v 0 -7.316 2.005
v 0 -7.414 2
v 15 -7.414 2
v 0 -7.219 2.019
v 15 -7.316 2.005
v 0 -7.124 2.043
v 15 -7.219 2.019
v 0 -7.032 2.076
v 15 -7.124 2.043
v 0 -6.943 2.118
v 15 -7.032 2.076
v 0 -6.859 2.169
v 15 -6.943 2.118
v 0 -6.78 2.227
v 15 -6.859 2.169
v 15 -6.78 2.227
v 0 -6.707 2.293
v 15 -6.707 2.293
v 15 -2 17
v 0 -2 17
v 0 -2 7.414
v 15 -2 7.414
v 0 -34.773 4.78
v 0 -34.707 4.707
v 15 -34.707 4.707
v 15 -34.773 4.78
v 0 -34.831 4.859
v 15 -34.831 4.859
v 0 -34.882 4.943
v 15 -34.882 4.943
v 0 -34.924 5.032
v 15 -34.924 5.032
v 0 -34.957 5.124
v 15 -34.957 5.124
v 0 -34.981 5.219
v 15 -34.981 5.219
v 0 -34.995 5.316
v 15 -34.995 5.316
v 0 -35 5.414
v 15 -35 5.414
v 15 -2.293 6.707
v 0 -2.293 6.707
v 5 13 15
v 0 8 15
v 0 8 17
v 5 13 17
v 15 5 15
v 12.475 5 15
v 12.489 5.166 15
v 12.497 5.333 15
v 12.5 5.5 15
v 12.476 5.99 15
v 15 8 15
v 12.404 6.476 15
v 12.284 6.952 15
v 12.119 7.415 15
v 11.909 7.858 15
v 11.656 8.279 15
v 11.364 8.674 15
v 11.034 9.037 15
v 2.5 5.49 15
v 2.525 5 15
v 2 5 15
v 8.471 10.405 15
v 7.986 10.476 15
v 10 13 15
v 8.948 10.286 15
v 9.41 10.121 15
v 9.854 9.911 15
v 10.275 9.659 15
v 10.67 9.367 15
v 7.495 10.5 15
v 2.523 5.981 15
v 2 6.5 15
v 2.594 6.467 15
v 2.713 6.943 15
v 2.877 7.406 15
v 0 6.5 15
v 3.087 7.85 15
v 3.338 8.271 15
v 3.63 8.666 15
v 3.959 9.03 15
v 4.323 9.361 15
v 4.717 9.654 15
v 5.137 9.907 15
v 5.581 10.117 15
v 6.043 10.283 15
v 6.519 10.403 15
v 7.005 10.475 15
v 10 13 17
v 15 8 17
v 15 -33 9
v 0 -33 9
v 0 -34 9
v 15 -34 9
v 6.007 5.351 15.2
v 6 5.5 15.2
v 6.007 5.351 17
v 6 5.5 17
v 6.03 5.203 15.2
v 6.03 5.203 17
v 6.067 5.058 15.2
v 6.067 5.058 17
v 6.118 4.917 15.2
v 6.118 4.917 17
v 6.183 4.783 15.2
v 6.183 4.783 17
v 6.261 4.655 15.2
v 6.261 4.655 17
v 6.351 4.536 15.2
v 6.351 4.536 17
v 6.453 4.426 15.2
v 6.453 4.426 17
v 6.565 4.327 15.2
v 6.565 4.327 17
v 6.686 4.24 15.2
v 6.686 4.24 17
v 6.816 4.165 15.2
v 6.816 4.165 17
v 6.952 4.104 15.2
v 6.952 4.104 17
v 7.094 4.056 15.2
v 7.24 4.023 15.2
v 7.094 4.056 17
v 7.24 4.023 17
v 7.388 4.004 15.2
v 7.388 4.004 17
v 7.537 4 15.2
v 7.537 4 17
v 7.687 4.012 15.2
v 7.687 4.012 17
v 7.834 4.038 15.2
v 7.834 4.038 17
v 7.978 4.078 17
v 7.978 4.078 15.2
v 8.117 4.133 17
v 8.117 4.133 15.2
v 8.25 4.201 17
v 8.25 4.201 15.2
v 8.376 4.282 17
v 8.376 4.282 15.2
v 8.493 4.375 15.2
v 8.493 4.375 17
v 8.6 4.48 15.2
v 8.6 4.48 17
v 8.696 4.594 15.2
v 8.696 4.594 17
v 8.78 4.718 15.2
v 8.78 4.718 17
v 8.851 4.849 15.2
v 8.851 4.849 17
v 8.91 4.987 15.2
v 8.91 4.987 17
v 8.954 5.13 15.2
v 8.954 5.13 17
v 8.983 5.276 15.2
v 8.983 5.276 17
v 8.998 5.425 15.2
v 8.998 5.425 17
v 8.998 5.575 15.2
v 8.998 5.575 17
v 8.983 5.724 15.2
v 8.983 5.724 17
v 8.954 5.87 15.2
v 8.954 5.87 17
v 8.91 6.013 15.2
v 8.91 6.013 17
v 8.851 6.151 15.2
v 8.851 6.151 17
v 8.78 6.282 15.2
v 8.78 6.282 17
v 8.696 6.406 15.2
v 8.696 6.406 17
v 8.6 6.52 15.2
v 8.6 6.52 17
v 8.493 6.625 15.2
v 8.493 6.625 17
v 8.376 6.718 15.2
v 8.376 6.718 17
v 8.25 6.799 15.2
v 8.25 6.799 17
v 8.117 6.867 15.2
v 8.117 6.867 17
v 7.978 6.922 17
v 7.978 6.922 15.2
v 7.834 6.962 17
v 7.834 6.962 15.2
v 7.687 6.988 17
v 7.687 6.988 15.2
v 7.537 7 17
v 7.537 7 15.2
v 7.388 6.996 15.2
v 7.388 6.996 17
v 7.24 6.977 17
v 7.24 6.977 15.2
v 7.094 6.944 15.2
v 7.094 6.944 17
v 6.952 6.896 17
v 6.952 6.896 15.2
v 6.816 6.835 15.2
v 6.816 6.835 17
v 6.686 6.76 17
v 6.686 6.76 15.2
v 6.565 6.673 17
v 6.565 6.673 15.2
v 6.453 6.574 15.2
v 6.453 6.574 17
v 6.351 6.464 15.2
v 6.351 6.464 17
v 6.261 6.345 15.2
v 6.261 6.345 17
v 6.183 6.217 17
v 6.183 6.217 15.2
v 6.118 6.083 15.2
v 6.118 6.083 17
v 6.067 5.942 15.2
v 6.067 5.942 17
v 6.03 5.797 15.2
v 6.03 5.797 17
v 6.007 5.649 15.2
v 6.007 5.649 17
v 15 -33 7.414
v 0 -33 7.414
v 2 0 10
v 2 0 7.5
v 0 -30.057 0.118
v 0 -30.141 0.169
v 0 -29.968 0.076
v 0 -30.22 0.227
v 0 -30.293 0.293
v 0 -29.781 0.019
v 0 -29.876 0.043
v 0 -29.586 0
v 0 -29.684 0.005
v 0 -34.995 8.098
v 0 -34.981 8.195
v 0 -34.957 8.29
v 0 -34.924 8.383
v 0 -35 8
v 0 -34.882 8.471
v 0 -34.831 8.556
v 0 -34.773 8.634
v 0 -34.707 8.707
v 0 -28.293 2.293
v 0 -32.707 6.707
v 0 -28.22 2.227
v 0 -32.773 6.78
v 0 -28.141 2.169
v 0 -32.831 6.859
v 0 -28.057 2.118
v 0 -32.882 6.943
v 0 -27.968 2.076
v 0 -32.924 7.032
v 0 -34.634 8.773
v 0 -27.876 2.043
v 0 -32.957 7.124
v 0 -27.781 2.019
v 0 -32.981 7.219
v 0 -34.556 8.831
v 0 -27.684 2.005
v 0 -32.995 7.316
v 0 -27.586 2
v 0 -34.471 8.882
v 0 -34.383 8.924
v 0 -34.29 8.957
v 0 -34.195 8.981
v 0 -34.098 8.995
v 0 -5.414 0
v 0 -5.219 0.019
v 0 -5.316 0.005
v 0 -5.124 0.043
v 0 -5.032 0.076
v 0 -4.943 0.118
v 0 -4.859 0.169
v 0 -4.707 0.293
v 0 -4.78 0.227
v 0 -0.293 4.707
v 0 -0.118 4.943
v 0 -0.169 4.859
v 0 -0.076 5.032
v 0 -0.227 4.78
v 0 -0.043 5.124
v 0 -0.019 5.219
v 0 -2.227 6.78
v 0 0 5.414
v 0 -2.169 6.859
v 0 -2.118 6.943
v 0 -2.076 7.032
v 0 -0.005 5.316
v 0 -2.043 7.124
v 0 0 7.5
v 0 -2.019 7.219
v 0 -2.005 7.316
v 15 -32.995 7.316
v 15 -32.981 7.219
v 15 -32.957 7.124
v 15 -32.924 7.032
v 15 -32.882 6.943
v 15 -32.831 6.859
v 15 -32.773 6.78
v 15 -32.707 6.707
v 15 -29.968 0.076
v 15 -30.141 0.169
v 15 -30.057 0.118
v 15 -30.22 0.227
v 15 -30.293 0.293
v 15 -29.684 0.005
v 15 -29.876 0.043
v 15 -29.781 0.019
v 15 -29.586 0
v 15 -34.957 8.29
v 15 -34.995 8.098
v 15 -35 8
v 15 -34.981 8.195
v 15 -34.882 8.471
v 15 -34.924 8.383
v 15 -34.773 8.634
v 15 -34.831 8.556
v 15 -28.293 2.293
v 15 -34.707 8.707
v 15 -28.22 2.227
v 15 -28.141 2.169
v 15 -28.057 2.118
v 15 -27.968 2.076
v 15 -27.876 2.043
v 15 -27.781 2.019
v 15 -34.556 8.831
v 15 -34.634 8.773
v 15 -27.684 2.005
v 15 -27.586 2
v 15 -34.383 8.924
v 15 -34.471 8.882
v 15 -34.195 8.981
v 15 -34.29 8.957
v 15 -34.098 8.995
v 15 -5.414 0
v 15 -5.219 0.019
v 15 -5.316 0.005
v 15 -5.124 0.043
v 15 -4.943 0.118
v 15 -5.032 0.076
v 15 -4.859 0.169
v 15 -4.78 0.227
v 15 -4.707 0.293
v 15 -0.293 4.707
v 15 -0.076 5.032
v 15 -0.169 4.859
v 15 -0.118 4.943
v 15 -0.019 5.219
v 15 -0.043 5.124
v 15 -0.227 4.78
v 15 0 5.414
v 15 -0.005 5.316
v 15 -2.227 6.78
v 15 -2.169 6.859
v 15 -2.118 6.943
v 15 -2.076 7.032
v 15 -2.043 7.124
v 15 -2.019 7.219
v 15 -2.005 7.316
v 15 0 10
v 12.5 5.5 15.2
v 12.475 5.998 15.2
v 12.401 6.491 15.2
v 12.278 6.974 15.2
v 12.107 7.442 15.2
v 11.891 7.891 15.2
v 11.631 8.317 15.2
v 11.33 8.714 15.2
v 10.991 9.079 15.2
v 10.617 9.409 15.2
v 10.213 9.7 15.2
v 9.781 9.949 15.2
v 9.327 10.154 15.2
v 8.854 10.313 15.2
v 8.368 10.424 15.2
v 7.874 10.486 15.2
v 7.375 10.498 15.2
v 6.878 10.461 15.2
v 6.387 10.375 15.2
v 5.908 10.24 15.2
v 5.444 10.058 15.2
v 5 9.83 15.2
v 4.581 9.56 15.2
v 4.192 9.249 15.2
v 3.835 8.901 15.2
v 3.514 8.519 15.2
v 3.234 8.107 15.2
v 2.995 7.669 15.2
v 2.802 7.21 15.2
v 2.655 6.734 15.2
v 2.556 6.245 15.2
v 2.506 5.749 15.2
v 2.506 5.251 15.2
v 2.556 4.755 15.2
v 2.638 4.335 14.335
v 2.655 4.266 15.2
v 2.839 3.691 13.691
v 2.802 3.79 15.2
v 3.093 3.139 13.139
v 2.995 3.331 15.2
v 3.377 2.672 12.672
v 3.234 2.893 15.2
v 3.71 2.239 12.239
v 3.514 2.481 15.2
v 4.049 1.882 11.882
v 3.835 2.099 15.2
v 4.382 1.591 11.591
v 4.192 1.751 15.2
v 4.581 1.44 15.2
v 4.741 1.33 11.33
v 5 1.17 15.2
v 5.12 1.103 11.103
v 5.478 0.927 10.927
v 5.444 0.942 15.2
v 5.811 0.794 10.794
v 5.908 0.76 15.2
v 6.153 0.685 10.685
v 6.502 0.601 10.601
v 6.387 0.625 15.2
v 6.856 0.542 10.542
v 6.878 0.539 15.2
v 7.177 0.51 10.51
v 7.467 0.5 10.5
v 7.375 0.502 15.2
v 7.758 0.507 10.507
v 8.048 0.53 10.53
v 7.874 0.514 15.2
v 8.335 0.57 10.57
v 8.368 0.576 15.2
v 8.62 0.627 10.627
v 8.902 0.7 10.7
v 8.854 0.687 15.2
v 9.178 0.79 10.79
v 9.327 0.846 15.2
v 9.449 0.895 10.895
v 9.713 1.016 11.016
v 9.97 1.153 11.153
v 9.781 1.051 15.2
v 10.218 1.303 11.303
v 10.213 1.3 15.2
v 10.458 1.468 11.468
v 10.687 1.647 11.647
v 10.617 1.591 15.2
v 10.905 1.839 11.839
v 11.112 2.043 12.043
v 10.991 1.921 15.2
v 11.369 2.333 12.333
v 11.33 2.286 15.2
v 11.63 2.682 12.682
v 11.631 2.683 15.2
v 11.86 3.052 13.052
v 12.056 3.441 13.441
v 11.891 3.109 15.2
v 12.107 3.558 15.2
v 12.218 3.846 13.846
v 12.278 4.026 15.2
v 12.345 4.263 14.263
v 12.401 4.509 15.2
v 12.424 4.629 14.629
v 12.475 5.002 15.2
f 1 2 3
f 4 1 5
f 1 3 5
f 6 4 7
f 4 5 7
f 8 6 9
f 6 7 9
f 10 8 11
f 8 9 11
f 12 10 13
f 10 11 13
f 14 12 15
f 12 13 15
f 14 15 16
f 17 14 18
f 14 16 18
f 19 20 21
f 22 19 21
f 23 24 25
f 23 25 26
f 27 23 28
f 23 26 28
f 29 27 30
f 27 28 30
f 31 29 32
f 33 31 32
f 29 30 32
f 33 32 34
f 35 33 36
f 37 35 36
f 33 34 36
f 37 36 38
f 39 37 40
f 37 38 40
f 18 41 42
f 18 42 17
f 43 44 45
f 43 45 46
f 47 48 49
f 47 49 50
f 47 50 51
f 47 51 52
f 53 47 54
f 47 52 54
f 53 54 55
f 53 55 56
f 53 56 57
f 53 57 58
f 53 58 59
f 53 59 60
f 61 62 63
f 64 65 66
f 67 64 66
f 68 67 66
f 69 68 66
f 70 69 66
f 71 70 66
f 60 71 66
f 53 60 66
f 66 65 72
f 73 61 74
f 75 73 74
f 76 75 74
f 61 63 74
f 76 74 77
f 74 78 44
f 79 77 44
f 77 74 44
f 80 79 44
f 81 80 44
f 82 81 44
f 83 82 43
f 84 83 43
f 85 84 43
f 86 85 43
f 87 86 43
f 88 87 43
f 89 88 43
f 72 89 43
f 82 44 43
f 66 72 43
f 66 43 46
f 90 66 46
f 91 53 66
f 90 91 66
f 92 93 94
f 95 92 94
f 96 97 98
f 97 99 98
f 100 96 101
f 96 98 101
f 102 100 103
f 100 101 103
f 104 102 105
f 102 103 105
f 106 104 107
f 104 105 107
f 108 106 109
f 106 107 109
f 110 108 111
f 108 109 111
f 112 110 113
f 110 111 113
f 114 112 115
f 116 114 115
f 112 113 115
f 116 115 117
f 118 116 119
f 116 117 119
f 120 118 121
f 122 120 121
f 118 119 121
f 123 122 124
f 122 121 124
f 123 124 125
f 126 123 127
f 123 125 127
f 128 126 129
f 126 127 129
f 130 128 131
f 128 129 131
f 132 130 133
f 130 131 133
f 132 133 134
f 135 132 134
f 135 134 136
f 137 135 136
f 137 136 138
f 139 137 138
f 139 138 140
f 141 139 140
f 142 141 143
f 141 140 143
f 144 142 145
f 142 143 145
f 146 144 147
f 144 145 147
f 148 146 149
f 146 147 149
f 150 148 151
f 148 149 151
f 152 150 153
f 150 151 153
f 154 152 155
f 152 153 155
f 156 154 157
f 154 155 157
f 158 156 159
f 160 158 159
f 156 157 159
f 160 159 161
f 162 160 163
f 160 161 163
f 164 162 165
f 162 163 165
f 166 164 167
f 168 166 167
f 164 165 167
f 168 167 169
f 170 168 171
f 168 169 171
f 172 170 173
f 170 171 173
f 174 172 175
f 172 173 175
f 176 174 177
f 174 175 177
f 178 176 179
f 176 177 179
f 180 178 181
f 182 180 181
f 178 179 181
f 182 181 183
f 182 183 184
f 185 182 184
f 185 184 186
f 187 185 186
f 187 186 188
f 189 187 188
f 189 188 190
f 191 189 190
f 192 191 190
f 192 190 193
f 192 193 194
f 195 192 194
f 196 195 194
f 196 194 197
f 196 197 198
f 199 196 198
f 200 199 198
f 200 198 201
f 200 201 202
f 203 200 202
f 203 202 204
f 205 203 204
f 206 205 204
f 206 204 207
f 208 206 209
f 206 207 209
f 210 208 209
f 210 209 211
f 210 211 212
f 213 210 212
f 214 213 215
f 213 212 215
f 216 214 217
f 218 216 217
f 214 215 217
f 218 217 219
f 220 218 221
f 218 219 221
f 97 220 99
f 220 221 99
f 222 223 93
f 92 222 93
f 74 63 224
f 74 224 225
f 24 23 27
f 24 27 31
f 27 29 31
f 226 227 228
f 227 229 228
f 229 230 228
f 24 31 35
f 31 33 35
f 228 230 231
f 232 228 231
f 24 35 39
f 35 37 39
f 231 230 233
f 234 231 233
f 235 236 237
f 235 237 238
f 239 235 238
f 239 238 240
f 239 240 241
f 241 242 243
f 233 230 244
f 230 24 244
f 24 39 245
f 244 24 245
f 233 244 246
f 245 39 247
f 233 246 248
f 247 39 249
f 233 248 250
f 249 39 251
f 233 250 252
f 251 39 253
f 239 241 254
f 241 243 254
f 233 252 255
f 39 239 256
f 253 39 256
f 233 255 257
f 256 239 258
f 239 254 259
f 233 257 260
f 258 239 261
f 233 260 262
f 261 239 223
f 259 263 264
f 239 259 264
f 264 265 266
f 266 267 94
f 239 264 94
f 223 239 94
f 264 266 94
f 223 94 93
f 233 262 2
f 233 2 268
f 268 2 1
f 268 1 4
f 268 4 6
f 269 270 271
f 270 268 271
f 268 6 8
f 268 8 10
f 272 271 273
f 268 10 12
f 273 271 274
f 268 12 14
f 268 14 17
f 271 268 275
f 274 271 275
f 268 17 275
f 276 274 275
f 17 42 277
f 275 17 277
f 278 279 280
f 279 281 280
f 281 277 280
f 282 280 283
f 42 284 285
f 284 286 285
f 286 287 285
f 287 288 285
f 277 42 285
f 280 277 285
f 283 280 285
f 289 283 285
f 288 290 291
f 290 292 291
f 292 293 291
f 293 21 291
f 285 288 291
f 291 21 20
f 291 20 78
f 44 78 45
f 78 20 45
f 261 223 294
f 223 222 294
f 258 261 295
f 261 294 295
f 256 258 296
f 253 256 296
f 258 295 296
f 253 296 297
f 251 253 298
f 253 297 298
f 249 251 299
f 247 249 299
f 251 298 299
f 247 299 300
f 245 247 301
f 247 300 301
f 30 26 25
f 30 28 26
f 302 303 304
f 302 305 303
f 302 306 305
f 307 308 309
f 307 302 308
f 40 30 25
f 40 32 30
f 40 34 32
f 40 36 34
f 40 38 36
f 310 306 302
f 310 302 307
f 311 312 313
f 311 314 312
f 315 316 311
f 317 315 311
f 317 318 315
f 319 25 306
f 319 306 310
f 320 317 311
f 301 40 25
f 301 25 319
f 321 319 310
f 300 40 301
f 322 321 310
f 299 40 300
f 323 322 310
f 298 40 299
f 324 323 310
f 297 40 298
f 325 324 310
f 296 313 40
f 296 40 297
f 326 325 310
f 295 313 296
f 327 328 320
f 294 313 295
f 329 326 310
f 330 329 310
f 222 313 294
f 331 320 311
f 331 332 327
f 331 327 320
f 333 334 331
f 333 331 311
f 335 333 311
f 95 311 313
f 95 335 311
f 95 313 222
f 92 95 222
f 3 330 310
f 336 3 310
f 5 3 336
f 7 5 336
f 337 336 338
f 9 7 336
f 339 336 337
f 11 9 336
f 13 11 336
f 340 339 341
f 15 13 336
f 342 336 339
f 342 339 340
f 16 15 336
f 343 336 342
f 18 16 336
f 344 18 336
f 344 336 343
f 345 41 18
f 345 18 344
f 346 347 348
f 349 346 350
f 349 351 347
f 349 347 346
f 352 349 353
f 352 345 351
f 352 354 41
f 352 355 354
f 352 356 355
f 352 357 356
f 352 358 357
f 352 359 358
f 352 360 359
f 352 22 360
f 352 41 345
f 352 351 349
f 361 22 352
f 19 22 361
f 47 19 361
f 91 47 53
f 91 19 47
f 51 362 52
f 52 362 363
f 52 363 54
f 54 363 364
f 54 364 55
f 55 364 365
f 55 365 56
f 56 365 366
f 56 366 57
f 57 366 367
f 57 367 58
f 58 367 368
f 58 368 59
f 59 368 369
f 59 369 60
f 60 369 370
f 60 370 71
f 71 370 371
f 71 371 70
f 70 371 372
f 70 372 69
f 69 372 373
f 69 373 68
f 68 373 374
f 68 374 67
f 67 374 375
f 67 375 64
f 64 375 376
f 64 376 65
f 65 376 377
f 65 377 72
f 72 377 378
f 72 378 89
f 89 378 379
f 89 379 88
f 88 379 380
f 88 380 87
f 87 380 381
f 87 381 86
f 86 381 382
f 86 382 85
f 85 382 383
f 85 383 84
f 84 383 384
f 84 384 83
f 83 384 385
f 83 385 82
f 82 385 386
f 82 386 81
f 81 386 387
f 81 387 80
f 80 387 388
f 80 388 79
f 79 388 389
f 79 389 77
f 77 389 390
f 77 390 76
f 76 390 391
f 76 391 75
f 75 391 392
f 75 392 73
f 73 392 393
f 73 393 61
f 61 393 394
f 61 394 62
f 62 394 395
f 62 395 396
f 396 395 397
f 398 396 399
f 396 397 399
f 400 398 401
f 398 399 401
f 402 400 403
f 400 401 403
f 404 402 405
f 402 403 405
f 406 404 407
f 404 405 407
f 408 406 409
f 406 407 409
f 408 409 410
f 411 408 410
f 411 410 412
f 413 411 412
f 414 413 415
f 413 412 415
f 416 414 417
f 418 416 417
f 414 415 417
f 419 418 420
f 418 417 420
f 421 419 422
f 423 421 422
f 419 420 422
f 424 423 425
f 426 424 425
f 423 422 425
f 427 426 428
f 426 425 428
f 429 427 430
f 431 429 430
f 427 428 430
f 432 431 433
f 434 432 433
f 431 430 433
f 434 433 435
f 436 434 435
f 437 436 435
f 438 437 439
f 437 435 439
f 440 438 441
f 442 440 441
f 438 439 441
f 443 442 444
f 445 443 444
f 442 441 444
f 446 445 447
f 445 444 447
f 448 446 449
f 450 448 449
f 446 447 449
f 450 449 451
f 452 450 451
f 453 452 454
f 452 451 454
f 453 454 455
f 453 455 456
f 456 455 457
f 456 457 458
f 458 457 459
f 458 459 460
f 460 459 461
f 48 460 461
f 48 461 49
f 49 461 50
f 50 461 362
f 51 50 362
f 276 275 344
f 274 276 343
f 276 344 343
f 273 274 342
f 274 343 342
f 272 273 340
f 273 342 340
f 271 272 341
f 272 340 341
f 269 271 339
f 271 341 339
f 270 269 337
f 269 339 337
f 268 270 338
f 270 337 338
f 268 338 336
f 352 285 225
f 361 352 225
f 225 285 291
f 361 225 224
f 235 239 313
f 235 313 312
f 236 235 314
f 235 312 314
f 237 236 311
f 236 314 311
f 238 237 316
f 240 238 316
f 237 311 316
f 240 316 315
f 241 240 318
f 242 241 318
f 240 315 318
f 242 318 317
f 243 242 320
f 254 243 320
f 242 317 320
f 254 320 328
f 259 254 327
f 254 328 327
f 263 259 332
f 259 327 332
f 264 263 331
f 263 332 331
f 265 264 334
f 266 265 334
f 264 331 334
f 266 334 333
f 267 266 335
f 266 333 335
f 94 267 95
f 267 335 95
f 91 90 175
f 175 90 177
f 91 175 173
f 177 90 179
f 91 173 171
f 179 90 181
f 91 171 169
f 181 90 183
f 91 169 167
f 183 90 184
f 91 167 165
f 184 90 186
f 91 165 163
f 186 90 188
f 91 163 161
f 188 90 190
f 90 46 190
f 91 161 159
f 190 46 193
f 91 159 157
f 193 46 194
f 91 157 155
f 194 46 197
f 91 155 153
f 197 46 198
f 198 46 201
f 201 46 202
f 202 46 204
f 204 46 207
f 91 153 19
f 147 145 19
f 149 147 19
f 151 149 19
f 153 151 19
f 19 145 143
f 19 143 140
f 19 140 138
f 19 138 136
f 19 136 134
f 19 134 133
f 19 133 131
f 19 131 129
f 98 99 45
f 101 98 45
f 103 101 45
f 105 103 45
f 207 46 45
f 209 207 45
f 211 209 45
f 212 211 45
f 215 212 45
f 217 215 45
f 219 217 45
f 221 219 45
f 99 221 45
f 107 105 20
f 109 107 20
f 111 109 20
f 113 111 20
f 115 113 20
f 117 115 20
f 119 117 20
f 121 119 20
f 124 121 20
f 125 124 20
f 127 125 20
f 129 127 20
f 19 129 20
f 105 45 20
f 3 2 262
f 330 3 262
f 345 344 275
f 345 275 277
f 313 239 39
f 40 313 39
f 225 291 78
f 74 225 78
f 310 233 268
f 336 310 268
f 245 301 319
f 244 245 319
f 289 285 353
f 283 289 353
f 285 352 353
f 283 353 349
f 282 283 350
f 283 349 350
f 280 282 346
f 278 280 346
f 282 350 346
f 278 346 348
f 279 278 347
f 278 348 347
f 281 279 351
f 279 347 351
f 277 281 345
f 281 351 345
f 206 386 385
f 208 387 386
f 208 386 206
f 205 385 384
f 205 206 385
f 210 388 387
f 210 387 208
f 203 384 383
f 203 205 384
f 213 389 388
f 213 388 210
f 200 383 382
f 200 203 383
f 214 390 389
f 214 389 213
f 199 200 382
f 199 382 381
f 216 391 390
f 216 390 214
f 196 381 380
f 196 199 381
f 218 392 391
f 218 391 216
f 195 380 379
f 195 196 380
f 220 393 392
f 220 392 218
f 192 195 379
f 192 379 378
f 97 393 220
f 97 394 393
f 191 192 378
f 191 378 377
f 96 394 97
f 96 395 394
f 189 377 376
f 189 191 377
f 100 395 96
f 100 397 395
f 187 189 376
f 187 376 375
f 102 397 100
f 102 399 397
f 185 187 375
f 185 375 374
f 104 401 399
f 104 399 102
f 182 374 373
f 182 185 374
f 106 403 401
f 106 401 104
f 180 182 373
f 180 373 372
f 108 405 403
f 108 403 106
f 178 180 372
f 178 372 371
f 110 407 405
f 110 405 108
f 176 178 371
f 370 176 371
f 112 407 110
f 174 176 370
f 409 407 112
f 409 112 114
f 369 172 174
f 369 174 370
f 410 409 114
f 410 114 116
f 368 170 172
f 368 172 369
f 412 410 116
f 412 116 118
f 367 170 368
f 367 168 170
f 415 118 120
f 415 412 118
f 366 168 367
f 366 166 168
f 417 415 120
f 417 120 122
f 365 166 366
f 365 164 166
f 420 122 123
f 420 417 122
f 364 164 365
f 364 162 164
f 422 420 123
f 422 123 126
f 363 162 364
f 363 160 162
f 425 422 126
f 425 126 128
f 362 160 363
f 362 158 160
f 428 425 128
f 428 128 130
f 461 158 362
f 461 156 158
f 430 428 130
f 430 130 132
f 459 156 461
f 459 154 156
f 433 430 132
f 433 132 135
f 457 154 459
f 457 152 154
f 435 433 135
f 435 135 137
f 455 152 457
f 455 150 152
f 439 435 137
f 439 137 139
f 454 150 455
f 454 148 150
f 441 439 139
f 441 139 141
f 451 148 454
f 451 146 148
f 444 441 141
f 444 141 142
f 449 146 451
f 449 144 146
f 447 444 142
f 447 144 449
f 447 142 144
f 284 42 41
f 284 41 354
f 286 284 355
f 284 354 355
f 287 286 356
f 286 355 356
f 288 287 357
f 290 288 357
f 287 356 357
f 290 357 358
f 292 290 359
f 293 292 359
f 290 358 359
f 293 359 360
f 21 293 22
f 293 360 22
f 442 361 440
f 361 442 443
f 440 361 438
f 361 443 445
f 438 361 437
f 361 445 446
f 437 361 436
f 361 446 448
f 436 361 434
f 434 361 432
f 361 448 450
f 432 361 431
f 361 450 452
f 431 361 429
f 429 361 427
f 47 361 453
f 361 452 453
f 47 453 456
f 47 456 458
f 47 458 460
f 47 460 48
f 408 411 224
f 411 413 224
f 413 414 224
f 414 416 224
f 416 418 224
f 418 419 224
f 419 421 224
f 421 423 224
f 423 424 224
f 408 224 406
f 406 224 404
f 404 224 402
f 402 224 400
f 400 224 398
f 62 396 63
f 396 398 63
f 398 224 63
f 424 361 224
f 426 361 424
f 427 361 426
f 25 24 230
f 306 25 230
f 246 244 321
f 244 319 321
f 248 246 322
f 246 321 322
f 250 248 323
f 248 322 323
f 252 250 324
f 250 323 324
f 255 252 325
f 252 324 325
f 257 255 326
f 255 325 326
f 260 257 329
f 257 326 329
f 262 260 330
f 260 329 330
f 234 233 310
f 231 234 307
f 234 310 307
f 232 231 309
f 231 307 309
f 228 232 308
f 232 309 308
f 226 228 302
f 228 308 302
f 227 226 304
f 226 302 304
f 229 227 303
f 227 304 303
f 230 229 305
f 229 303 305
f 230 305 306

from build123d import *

# Parameters (mm, degrees)
F1_DEPTH       = 15
F2_DEPTH       = 2
F4_D           = 3
F4_DEPTH       = 100
F4_CBORE_D     = 10
F4_CBORE_DEPTH = 0.2
F4_TIP         = 0.9012909285
F5_T1_DEPTH    = 15
F5_T6_DEPTH    = 13
F5_S7_R        = 5
F5_T8_DEPTH    = 9
F5_T9_DEPTH    = 40.7168298797
F5_T11_DEPTH   = 27.7168298797
F6_R           = 1


# Not quite as in the source:
# - a fillet or chamfer that OpenCascade refuses, or shapes differently, is made with other operations: its cross-section is extruded or revolved along the edge and cut away or added


with BuildPart() as f1:
    # F0 (on Right) → F1 (new body)
    with BuildSketch(Plane.YZ):
        Polygon((-35, 9), (-35, 0), (0, 0), (0, 7.5), (0, 15), (6.5, 15), (13, 15), (13, 17), (-2, 17), (-2, 2), (-33, 2), (-33, 9), align=None)
    extrude(amount=F1_DEPTH)

    # F0 (on Right) → F2 (join)
    with BuildSketch(Plane.YZ):
        Polygon((0, 15), (0, 7.5), (6.5, 15), align=None)
    extrude(amount=F2_DEPTH)

    # F4
    with Locations(Plane(origin=(0, 0, 15), x_dir=(1, 0, 0), z_dir=(0, 0, -1))):
        with Locations((7.5, -5.5)):
            CounterBoreHole(F4_D / 2, F4_CBORE_D / 2, F4_CBORE_DEPTH, depth=F4_DEPTH)
            with Locations((0, 0, -(F4_DEPTH + F4_TIP / 2))):  # 118° drill point
                Cone(0, F4_D / 2, F4_TIP, mode=Mode.SUBTRACT)

    # F5: chamfer of 5 on 7 edges, made by hand

    # F5_s2 → F5_t1 (join)
    with BuildSketch(Plane.YZ):
        Polygon((-2, 7), (-7, 2), (-2, 2), align=None)
        Polygon((-33, 7), (-28, 2), (-33, 2), align=None)
    extrude(amount=F5_T1_DEPTH)


with BuildPart() as f5_tool4:
    # F5_s5 → F5_t6 (new body)
    with BuildSketch(Plane.YZ.offset(2)):
        Polygon((0, 10), (5, 15), (0, 15), align=None)
    extrude(amount=F5_T6_DEPTH)

    # F5_s7 → F5_t8 (cut, symmetric)
    with BuildSketch(Plane.XY.offset(12.5)):
        with Locations((7.5, 5.5)):
            Circle(F5_S7_R)
    extrude(amount=F5_T8_DEPTH, both=True, mode=Mode.SUBTRACT)


with BuildPart() as f1_1:
    add(f1.part)

    # F5_t3: union F5_tool4
    add(f5_tool4.part)

    # F5_s10 → F5_t9 (cut)
    with BuildSketch(Plane.YZ.offset(-12.8584149398)):
        Polygon((-35, 5), (-30, 0), (-35, 0), align=None)
        Polygon((-5, 0), (0, 5), (0, 0), align=None)
    extrude(amount=F5_T9_DEPTH, mode=Mode.SUBTRACT)

    # F5_s12 → F5_t11 (cut)
    with BuildSketch(Plane.XY.offset(2.1415850602)):
        Polygon((15, 8), (10, 13), (15, 13), align=None)
        Polygon((0, 8), (5, 13), (0, 13), align=None)
    extrude(amount=F5_T11_DEPTH, mode=Mode.SUBTRACT)

    # F6
    f6_edges = [f1_1.edges().sort_by_distance(p)[0] for p in [
        (7.5, -35, 9),
        (7.5, 0, 5),
        (7.5, -5, 0),
        (7.5, -30, 0),
        (7.5, -35, 5),
        (7.5, -33, 7),
        (7.5, -28, 2),
        (7.5, -7, 2),
        (7.5, -2, 7),
    ]]
    fillet(f6_edges, radius=F6_R)


solid = f1_1.part
